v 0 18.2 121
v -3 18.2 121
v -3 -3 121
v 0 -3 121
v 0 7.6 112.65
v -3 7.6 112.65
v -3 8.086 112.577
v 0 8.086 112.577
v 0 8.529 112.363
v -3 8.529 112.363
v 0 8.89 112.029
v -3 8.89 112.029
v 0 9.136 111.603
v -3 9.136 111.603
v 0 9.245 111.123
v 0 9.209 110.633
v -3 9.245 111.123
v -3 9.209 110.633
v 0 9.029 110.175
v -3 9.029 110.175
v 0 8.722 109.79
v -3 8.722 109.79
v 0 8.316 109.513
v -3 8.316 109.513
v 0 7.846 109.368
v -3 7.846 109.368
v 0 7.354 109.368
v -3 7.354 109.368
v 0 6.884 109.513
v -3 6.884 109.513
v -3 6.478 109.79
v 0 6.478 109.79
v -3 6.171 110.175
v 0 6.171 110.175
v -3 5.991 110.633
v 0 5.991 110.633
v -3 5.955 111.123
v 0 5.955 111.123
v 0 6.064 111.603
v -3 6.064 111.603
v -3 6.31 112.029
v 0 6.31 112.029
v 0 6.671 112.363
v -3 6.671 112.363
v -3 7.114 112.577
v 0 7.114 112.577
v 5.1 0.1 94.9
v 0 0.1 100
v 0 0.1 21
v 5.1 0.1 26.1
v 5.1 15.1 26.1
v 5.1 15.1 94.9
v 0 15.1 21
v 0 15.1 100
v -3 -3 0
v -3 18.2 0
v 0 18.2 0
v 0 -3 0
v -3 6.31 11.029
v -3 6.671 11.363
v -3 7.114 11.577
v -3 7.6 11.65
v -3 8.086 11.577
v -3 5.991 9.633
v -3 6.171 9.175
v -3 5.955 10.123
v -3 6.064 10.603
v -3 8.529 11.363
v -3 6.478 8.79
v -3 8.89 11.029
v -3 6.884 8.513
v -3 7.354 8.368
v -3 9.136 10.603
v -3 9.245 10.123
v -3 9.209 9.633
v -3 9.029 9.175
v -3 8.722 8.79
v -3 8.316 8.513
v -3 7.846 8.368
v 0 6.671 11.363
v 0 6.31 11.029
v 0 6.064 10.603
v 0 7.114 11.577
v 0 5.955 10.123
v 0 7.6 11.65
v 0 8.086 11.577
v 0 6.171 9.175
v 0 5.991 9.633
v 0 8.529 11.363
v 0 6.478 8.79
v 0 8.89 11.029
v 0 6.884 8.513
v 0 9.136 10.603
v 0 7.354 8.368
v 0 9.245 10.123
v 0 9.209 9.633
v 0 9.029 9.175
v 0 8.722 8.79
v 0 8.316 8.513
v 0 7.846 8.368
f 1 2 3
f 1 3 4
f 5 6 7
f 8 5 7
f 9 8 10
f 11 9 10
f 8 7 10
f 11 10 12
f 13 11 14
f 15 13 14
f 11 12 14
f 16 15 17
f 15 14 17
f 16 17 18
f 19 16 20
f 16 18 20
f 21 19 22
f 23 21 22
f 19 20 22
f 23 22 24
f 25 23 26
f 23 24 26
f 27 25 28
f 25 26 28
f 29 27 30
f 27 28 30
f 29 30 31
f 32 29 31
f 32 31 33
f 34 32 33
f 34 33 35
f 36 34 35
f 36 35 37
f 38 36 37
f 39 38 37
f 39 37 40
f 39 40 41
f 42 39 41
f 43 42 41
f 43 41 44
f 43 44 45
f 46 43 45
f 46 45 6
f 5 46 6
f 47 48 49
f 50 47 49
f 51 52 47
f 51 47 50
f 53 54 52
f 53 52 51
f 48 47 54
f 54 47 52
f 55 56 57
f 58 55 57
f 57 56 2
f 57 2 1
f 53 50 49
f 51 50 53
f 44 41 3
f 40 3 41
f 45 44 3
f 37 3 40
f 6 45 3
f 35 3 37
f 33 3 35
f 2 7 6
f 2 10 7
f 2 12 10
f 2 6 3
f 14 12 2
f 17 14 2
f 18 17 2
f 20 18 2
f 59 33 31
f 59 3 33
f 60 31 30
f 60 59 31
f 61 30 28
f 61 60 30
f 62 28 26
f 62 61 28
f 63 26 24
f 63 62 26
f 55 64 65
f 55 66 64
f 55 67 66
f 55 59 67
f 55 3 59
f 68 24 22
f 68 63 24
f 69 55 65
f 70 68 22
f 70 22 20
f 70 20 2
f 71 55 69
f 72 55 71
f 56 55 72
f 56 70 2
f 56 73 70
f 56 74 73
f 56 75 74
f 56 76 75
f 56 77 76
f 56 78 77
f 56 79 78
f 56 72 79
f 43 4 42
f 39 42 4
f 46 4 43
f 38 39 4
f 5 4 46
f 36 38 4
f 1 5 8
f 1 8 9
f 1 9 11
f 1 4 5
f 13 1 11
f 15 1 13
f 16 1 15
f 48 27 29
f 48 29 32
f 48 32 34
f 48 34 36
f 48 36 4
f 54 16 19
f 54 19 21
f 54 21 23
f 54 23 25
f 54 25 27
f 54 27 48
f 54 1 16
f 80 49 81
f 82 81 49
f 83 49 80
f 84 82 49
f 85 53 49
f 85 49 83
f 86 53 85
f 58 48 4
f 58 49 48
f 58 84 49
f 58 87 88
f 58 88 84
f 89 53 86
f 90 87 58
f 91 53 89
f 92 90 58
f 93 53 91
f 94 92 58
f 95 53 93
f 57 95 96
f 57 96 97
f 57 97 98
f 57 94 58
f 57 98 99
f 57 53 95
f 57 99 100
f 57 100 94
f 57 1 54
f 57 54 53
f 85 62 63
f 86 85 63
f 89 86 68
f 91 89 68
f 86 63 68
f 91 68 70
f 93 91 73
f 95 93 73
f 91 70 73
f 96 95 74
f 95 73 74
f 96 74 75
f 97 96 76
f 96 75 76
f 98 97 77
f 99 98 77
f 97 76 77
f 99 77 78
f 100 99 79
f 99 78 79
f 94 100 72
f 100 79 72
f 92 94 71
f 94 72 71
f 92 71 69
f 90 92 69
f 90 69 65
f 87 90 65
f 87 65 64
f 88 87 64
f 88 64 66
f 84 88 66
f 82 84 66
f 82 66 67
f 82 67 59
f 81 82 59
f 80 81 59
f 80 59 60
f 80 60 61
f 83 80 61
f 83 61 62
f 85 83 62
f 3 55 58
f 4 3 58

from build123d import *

# Parameters (mm, degrees)
SKETCH_1_W          = 21.2
SKETCH_1_H          = 21.2
SKETCH_1_W_2        = 15.2
SKETCH_1_H_2        = 15.2
EXTRUDE_1_DEPTH     = 121
SKETCH_2_R          = 1.65
CUT_EXTRUDE_1_DEPTH = 30
SKETCH_3_W          = 121
SKETCH_3_H          = 21.2
CUT_EXTRUDE_2_DEPTH = 18.2
SKETCH_4_W          = 68.8
SKETCH_4_H          = 15
EXTRUDE_1_2_DEPTH   = 5.1
CHAMFER_1_SIZE      = 5.1


with BuildPart() as part:
    # 草图1 → Extrude 1 (new body)
    with BuildSketch(Plane.XY):
        with Locations((7.6, 7.6)):
            Rectangle(SKETCH_1_W, SKETCH_1_H)
        with Locations((7.6, 7.6)):
            Rectangle(SKETCH_1_W_2, SKETCH_1_H_2, mode=Mode.SUBTRACT)
    extrude(amount=EXTRUDE_1_DEPTH)

    # 草图2 → 切除-拉伸1 (cut)
    with BuildSketch(Plane.ZY.offset(3)):
        with Locations((10, 7.6)):
            Circle(SKETCH_2_R)
        with Locations((111, 7.6)):
            Circle(SKETCH_2_R)
    extrude(amount=-CUT_EXTRUDE_1_DEPTH, mode=Mode.SUBTRACT)

    # 草图3 → 切除-拉伸2 (cut)
    with BuildSketch(Plane(origin=(18.2, 0, 0), x_dir=(0, 0, -1), z_dir=(1, 0, 0))):
        with Locations((-60.5, 7.6)):
            Rectangle(SKETCH_3_W, SKETCH_3_H)
    extrude(amount=-CUT_EXTRUDE_2_DEPTH, mode=Mode.SUBTRACT)

    # 草图4 → Extrude 1 2 (add)
    with BuildSketch(Plane(origin=(0, 0, 0), x_dir=(0, 0, -1), z_dir=(1, 0, 0))):
        with Locations((-60.5, 7.6)):
            Rectangle(SKETCH_4_W, SKETCH_4_H)
    extrude(amount=EXTRUDE_1_2_DEPTH)

    # 倒角1
    chamfer_1_edges = [part.edges().sort_by_distance(p)[0] for p in [
        (0, 7.6, 26.1),
        (0, 7.6, 94.9),
    ]]
    chamfer(chamfer_1_edges, length=CHAMFER_1_SIZE - 0.0001)  # a hair under: the kernel refuses the full size


solid = part.part
